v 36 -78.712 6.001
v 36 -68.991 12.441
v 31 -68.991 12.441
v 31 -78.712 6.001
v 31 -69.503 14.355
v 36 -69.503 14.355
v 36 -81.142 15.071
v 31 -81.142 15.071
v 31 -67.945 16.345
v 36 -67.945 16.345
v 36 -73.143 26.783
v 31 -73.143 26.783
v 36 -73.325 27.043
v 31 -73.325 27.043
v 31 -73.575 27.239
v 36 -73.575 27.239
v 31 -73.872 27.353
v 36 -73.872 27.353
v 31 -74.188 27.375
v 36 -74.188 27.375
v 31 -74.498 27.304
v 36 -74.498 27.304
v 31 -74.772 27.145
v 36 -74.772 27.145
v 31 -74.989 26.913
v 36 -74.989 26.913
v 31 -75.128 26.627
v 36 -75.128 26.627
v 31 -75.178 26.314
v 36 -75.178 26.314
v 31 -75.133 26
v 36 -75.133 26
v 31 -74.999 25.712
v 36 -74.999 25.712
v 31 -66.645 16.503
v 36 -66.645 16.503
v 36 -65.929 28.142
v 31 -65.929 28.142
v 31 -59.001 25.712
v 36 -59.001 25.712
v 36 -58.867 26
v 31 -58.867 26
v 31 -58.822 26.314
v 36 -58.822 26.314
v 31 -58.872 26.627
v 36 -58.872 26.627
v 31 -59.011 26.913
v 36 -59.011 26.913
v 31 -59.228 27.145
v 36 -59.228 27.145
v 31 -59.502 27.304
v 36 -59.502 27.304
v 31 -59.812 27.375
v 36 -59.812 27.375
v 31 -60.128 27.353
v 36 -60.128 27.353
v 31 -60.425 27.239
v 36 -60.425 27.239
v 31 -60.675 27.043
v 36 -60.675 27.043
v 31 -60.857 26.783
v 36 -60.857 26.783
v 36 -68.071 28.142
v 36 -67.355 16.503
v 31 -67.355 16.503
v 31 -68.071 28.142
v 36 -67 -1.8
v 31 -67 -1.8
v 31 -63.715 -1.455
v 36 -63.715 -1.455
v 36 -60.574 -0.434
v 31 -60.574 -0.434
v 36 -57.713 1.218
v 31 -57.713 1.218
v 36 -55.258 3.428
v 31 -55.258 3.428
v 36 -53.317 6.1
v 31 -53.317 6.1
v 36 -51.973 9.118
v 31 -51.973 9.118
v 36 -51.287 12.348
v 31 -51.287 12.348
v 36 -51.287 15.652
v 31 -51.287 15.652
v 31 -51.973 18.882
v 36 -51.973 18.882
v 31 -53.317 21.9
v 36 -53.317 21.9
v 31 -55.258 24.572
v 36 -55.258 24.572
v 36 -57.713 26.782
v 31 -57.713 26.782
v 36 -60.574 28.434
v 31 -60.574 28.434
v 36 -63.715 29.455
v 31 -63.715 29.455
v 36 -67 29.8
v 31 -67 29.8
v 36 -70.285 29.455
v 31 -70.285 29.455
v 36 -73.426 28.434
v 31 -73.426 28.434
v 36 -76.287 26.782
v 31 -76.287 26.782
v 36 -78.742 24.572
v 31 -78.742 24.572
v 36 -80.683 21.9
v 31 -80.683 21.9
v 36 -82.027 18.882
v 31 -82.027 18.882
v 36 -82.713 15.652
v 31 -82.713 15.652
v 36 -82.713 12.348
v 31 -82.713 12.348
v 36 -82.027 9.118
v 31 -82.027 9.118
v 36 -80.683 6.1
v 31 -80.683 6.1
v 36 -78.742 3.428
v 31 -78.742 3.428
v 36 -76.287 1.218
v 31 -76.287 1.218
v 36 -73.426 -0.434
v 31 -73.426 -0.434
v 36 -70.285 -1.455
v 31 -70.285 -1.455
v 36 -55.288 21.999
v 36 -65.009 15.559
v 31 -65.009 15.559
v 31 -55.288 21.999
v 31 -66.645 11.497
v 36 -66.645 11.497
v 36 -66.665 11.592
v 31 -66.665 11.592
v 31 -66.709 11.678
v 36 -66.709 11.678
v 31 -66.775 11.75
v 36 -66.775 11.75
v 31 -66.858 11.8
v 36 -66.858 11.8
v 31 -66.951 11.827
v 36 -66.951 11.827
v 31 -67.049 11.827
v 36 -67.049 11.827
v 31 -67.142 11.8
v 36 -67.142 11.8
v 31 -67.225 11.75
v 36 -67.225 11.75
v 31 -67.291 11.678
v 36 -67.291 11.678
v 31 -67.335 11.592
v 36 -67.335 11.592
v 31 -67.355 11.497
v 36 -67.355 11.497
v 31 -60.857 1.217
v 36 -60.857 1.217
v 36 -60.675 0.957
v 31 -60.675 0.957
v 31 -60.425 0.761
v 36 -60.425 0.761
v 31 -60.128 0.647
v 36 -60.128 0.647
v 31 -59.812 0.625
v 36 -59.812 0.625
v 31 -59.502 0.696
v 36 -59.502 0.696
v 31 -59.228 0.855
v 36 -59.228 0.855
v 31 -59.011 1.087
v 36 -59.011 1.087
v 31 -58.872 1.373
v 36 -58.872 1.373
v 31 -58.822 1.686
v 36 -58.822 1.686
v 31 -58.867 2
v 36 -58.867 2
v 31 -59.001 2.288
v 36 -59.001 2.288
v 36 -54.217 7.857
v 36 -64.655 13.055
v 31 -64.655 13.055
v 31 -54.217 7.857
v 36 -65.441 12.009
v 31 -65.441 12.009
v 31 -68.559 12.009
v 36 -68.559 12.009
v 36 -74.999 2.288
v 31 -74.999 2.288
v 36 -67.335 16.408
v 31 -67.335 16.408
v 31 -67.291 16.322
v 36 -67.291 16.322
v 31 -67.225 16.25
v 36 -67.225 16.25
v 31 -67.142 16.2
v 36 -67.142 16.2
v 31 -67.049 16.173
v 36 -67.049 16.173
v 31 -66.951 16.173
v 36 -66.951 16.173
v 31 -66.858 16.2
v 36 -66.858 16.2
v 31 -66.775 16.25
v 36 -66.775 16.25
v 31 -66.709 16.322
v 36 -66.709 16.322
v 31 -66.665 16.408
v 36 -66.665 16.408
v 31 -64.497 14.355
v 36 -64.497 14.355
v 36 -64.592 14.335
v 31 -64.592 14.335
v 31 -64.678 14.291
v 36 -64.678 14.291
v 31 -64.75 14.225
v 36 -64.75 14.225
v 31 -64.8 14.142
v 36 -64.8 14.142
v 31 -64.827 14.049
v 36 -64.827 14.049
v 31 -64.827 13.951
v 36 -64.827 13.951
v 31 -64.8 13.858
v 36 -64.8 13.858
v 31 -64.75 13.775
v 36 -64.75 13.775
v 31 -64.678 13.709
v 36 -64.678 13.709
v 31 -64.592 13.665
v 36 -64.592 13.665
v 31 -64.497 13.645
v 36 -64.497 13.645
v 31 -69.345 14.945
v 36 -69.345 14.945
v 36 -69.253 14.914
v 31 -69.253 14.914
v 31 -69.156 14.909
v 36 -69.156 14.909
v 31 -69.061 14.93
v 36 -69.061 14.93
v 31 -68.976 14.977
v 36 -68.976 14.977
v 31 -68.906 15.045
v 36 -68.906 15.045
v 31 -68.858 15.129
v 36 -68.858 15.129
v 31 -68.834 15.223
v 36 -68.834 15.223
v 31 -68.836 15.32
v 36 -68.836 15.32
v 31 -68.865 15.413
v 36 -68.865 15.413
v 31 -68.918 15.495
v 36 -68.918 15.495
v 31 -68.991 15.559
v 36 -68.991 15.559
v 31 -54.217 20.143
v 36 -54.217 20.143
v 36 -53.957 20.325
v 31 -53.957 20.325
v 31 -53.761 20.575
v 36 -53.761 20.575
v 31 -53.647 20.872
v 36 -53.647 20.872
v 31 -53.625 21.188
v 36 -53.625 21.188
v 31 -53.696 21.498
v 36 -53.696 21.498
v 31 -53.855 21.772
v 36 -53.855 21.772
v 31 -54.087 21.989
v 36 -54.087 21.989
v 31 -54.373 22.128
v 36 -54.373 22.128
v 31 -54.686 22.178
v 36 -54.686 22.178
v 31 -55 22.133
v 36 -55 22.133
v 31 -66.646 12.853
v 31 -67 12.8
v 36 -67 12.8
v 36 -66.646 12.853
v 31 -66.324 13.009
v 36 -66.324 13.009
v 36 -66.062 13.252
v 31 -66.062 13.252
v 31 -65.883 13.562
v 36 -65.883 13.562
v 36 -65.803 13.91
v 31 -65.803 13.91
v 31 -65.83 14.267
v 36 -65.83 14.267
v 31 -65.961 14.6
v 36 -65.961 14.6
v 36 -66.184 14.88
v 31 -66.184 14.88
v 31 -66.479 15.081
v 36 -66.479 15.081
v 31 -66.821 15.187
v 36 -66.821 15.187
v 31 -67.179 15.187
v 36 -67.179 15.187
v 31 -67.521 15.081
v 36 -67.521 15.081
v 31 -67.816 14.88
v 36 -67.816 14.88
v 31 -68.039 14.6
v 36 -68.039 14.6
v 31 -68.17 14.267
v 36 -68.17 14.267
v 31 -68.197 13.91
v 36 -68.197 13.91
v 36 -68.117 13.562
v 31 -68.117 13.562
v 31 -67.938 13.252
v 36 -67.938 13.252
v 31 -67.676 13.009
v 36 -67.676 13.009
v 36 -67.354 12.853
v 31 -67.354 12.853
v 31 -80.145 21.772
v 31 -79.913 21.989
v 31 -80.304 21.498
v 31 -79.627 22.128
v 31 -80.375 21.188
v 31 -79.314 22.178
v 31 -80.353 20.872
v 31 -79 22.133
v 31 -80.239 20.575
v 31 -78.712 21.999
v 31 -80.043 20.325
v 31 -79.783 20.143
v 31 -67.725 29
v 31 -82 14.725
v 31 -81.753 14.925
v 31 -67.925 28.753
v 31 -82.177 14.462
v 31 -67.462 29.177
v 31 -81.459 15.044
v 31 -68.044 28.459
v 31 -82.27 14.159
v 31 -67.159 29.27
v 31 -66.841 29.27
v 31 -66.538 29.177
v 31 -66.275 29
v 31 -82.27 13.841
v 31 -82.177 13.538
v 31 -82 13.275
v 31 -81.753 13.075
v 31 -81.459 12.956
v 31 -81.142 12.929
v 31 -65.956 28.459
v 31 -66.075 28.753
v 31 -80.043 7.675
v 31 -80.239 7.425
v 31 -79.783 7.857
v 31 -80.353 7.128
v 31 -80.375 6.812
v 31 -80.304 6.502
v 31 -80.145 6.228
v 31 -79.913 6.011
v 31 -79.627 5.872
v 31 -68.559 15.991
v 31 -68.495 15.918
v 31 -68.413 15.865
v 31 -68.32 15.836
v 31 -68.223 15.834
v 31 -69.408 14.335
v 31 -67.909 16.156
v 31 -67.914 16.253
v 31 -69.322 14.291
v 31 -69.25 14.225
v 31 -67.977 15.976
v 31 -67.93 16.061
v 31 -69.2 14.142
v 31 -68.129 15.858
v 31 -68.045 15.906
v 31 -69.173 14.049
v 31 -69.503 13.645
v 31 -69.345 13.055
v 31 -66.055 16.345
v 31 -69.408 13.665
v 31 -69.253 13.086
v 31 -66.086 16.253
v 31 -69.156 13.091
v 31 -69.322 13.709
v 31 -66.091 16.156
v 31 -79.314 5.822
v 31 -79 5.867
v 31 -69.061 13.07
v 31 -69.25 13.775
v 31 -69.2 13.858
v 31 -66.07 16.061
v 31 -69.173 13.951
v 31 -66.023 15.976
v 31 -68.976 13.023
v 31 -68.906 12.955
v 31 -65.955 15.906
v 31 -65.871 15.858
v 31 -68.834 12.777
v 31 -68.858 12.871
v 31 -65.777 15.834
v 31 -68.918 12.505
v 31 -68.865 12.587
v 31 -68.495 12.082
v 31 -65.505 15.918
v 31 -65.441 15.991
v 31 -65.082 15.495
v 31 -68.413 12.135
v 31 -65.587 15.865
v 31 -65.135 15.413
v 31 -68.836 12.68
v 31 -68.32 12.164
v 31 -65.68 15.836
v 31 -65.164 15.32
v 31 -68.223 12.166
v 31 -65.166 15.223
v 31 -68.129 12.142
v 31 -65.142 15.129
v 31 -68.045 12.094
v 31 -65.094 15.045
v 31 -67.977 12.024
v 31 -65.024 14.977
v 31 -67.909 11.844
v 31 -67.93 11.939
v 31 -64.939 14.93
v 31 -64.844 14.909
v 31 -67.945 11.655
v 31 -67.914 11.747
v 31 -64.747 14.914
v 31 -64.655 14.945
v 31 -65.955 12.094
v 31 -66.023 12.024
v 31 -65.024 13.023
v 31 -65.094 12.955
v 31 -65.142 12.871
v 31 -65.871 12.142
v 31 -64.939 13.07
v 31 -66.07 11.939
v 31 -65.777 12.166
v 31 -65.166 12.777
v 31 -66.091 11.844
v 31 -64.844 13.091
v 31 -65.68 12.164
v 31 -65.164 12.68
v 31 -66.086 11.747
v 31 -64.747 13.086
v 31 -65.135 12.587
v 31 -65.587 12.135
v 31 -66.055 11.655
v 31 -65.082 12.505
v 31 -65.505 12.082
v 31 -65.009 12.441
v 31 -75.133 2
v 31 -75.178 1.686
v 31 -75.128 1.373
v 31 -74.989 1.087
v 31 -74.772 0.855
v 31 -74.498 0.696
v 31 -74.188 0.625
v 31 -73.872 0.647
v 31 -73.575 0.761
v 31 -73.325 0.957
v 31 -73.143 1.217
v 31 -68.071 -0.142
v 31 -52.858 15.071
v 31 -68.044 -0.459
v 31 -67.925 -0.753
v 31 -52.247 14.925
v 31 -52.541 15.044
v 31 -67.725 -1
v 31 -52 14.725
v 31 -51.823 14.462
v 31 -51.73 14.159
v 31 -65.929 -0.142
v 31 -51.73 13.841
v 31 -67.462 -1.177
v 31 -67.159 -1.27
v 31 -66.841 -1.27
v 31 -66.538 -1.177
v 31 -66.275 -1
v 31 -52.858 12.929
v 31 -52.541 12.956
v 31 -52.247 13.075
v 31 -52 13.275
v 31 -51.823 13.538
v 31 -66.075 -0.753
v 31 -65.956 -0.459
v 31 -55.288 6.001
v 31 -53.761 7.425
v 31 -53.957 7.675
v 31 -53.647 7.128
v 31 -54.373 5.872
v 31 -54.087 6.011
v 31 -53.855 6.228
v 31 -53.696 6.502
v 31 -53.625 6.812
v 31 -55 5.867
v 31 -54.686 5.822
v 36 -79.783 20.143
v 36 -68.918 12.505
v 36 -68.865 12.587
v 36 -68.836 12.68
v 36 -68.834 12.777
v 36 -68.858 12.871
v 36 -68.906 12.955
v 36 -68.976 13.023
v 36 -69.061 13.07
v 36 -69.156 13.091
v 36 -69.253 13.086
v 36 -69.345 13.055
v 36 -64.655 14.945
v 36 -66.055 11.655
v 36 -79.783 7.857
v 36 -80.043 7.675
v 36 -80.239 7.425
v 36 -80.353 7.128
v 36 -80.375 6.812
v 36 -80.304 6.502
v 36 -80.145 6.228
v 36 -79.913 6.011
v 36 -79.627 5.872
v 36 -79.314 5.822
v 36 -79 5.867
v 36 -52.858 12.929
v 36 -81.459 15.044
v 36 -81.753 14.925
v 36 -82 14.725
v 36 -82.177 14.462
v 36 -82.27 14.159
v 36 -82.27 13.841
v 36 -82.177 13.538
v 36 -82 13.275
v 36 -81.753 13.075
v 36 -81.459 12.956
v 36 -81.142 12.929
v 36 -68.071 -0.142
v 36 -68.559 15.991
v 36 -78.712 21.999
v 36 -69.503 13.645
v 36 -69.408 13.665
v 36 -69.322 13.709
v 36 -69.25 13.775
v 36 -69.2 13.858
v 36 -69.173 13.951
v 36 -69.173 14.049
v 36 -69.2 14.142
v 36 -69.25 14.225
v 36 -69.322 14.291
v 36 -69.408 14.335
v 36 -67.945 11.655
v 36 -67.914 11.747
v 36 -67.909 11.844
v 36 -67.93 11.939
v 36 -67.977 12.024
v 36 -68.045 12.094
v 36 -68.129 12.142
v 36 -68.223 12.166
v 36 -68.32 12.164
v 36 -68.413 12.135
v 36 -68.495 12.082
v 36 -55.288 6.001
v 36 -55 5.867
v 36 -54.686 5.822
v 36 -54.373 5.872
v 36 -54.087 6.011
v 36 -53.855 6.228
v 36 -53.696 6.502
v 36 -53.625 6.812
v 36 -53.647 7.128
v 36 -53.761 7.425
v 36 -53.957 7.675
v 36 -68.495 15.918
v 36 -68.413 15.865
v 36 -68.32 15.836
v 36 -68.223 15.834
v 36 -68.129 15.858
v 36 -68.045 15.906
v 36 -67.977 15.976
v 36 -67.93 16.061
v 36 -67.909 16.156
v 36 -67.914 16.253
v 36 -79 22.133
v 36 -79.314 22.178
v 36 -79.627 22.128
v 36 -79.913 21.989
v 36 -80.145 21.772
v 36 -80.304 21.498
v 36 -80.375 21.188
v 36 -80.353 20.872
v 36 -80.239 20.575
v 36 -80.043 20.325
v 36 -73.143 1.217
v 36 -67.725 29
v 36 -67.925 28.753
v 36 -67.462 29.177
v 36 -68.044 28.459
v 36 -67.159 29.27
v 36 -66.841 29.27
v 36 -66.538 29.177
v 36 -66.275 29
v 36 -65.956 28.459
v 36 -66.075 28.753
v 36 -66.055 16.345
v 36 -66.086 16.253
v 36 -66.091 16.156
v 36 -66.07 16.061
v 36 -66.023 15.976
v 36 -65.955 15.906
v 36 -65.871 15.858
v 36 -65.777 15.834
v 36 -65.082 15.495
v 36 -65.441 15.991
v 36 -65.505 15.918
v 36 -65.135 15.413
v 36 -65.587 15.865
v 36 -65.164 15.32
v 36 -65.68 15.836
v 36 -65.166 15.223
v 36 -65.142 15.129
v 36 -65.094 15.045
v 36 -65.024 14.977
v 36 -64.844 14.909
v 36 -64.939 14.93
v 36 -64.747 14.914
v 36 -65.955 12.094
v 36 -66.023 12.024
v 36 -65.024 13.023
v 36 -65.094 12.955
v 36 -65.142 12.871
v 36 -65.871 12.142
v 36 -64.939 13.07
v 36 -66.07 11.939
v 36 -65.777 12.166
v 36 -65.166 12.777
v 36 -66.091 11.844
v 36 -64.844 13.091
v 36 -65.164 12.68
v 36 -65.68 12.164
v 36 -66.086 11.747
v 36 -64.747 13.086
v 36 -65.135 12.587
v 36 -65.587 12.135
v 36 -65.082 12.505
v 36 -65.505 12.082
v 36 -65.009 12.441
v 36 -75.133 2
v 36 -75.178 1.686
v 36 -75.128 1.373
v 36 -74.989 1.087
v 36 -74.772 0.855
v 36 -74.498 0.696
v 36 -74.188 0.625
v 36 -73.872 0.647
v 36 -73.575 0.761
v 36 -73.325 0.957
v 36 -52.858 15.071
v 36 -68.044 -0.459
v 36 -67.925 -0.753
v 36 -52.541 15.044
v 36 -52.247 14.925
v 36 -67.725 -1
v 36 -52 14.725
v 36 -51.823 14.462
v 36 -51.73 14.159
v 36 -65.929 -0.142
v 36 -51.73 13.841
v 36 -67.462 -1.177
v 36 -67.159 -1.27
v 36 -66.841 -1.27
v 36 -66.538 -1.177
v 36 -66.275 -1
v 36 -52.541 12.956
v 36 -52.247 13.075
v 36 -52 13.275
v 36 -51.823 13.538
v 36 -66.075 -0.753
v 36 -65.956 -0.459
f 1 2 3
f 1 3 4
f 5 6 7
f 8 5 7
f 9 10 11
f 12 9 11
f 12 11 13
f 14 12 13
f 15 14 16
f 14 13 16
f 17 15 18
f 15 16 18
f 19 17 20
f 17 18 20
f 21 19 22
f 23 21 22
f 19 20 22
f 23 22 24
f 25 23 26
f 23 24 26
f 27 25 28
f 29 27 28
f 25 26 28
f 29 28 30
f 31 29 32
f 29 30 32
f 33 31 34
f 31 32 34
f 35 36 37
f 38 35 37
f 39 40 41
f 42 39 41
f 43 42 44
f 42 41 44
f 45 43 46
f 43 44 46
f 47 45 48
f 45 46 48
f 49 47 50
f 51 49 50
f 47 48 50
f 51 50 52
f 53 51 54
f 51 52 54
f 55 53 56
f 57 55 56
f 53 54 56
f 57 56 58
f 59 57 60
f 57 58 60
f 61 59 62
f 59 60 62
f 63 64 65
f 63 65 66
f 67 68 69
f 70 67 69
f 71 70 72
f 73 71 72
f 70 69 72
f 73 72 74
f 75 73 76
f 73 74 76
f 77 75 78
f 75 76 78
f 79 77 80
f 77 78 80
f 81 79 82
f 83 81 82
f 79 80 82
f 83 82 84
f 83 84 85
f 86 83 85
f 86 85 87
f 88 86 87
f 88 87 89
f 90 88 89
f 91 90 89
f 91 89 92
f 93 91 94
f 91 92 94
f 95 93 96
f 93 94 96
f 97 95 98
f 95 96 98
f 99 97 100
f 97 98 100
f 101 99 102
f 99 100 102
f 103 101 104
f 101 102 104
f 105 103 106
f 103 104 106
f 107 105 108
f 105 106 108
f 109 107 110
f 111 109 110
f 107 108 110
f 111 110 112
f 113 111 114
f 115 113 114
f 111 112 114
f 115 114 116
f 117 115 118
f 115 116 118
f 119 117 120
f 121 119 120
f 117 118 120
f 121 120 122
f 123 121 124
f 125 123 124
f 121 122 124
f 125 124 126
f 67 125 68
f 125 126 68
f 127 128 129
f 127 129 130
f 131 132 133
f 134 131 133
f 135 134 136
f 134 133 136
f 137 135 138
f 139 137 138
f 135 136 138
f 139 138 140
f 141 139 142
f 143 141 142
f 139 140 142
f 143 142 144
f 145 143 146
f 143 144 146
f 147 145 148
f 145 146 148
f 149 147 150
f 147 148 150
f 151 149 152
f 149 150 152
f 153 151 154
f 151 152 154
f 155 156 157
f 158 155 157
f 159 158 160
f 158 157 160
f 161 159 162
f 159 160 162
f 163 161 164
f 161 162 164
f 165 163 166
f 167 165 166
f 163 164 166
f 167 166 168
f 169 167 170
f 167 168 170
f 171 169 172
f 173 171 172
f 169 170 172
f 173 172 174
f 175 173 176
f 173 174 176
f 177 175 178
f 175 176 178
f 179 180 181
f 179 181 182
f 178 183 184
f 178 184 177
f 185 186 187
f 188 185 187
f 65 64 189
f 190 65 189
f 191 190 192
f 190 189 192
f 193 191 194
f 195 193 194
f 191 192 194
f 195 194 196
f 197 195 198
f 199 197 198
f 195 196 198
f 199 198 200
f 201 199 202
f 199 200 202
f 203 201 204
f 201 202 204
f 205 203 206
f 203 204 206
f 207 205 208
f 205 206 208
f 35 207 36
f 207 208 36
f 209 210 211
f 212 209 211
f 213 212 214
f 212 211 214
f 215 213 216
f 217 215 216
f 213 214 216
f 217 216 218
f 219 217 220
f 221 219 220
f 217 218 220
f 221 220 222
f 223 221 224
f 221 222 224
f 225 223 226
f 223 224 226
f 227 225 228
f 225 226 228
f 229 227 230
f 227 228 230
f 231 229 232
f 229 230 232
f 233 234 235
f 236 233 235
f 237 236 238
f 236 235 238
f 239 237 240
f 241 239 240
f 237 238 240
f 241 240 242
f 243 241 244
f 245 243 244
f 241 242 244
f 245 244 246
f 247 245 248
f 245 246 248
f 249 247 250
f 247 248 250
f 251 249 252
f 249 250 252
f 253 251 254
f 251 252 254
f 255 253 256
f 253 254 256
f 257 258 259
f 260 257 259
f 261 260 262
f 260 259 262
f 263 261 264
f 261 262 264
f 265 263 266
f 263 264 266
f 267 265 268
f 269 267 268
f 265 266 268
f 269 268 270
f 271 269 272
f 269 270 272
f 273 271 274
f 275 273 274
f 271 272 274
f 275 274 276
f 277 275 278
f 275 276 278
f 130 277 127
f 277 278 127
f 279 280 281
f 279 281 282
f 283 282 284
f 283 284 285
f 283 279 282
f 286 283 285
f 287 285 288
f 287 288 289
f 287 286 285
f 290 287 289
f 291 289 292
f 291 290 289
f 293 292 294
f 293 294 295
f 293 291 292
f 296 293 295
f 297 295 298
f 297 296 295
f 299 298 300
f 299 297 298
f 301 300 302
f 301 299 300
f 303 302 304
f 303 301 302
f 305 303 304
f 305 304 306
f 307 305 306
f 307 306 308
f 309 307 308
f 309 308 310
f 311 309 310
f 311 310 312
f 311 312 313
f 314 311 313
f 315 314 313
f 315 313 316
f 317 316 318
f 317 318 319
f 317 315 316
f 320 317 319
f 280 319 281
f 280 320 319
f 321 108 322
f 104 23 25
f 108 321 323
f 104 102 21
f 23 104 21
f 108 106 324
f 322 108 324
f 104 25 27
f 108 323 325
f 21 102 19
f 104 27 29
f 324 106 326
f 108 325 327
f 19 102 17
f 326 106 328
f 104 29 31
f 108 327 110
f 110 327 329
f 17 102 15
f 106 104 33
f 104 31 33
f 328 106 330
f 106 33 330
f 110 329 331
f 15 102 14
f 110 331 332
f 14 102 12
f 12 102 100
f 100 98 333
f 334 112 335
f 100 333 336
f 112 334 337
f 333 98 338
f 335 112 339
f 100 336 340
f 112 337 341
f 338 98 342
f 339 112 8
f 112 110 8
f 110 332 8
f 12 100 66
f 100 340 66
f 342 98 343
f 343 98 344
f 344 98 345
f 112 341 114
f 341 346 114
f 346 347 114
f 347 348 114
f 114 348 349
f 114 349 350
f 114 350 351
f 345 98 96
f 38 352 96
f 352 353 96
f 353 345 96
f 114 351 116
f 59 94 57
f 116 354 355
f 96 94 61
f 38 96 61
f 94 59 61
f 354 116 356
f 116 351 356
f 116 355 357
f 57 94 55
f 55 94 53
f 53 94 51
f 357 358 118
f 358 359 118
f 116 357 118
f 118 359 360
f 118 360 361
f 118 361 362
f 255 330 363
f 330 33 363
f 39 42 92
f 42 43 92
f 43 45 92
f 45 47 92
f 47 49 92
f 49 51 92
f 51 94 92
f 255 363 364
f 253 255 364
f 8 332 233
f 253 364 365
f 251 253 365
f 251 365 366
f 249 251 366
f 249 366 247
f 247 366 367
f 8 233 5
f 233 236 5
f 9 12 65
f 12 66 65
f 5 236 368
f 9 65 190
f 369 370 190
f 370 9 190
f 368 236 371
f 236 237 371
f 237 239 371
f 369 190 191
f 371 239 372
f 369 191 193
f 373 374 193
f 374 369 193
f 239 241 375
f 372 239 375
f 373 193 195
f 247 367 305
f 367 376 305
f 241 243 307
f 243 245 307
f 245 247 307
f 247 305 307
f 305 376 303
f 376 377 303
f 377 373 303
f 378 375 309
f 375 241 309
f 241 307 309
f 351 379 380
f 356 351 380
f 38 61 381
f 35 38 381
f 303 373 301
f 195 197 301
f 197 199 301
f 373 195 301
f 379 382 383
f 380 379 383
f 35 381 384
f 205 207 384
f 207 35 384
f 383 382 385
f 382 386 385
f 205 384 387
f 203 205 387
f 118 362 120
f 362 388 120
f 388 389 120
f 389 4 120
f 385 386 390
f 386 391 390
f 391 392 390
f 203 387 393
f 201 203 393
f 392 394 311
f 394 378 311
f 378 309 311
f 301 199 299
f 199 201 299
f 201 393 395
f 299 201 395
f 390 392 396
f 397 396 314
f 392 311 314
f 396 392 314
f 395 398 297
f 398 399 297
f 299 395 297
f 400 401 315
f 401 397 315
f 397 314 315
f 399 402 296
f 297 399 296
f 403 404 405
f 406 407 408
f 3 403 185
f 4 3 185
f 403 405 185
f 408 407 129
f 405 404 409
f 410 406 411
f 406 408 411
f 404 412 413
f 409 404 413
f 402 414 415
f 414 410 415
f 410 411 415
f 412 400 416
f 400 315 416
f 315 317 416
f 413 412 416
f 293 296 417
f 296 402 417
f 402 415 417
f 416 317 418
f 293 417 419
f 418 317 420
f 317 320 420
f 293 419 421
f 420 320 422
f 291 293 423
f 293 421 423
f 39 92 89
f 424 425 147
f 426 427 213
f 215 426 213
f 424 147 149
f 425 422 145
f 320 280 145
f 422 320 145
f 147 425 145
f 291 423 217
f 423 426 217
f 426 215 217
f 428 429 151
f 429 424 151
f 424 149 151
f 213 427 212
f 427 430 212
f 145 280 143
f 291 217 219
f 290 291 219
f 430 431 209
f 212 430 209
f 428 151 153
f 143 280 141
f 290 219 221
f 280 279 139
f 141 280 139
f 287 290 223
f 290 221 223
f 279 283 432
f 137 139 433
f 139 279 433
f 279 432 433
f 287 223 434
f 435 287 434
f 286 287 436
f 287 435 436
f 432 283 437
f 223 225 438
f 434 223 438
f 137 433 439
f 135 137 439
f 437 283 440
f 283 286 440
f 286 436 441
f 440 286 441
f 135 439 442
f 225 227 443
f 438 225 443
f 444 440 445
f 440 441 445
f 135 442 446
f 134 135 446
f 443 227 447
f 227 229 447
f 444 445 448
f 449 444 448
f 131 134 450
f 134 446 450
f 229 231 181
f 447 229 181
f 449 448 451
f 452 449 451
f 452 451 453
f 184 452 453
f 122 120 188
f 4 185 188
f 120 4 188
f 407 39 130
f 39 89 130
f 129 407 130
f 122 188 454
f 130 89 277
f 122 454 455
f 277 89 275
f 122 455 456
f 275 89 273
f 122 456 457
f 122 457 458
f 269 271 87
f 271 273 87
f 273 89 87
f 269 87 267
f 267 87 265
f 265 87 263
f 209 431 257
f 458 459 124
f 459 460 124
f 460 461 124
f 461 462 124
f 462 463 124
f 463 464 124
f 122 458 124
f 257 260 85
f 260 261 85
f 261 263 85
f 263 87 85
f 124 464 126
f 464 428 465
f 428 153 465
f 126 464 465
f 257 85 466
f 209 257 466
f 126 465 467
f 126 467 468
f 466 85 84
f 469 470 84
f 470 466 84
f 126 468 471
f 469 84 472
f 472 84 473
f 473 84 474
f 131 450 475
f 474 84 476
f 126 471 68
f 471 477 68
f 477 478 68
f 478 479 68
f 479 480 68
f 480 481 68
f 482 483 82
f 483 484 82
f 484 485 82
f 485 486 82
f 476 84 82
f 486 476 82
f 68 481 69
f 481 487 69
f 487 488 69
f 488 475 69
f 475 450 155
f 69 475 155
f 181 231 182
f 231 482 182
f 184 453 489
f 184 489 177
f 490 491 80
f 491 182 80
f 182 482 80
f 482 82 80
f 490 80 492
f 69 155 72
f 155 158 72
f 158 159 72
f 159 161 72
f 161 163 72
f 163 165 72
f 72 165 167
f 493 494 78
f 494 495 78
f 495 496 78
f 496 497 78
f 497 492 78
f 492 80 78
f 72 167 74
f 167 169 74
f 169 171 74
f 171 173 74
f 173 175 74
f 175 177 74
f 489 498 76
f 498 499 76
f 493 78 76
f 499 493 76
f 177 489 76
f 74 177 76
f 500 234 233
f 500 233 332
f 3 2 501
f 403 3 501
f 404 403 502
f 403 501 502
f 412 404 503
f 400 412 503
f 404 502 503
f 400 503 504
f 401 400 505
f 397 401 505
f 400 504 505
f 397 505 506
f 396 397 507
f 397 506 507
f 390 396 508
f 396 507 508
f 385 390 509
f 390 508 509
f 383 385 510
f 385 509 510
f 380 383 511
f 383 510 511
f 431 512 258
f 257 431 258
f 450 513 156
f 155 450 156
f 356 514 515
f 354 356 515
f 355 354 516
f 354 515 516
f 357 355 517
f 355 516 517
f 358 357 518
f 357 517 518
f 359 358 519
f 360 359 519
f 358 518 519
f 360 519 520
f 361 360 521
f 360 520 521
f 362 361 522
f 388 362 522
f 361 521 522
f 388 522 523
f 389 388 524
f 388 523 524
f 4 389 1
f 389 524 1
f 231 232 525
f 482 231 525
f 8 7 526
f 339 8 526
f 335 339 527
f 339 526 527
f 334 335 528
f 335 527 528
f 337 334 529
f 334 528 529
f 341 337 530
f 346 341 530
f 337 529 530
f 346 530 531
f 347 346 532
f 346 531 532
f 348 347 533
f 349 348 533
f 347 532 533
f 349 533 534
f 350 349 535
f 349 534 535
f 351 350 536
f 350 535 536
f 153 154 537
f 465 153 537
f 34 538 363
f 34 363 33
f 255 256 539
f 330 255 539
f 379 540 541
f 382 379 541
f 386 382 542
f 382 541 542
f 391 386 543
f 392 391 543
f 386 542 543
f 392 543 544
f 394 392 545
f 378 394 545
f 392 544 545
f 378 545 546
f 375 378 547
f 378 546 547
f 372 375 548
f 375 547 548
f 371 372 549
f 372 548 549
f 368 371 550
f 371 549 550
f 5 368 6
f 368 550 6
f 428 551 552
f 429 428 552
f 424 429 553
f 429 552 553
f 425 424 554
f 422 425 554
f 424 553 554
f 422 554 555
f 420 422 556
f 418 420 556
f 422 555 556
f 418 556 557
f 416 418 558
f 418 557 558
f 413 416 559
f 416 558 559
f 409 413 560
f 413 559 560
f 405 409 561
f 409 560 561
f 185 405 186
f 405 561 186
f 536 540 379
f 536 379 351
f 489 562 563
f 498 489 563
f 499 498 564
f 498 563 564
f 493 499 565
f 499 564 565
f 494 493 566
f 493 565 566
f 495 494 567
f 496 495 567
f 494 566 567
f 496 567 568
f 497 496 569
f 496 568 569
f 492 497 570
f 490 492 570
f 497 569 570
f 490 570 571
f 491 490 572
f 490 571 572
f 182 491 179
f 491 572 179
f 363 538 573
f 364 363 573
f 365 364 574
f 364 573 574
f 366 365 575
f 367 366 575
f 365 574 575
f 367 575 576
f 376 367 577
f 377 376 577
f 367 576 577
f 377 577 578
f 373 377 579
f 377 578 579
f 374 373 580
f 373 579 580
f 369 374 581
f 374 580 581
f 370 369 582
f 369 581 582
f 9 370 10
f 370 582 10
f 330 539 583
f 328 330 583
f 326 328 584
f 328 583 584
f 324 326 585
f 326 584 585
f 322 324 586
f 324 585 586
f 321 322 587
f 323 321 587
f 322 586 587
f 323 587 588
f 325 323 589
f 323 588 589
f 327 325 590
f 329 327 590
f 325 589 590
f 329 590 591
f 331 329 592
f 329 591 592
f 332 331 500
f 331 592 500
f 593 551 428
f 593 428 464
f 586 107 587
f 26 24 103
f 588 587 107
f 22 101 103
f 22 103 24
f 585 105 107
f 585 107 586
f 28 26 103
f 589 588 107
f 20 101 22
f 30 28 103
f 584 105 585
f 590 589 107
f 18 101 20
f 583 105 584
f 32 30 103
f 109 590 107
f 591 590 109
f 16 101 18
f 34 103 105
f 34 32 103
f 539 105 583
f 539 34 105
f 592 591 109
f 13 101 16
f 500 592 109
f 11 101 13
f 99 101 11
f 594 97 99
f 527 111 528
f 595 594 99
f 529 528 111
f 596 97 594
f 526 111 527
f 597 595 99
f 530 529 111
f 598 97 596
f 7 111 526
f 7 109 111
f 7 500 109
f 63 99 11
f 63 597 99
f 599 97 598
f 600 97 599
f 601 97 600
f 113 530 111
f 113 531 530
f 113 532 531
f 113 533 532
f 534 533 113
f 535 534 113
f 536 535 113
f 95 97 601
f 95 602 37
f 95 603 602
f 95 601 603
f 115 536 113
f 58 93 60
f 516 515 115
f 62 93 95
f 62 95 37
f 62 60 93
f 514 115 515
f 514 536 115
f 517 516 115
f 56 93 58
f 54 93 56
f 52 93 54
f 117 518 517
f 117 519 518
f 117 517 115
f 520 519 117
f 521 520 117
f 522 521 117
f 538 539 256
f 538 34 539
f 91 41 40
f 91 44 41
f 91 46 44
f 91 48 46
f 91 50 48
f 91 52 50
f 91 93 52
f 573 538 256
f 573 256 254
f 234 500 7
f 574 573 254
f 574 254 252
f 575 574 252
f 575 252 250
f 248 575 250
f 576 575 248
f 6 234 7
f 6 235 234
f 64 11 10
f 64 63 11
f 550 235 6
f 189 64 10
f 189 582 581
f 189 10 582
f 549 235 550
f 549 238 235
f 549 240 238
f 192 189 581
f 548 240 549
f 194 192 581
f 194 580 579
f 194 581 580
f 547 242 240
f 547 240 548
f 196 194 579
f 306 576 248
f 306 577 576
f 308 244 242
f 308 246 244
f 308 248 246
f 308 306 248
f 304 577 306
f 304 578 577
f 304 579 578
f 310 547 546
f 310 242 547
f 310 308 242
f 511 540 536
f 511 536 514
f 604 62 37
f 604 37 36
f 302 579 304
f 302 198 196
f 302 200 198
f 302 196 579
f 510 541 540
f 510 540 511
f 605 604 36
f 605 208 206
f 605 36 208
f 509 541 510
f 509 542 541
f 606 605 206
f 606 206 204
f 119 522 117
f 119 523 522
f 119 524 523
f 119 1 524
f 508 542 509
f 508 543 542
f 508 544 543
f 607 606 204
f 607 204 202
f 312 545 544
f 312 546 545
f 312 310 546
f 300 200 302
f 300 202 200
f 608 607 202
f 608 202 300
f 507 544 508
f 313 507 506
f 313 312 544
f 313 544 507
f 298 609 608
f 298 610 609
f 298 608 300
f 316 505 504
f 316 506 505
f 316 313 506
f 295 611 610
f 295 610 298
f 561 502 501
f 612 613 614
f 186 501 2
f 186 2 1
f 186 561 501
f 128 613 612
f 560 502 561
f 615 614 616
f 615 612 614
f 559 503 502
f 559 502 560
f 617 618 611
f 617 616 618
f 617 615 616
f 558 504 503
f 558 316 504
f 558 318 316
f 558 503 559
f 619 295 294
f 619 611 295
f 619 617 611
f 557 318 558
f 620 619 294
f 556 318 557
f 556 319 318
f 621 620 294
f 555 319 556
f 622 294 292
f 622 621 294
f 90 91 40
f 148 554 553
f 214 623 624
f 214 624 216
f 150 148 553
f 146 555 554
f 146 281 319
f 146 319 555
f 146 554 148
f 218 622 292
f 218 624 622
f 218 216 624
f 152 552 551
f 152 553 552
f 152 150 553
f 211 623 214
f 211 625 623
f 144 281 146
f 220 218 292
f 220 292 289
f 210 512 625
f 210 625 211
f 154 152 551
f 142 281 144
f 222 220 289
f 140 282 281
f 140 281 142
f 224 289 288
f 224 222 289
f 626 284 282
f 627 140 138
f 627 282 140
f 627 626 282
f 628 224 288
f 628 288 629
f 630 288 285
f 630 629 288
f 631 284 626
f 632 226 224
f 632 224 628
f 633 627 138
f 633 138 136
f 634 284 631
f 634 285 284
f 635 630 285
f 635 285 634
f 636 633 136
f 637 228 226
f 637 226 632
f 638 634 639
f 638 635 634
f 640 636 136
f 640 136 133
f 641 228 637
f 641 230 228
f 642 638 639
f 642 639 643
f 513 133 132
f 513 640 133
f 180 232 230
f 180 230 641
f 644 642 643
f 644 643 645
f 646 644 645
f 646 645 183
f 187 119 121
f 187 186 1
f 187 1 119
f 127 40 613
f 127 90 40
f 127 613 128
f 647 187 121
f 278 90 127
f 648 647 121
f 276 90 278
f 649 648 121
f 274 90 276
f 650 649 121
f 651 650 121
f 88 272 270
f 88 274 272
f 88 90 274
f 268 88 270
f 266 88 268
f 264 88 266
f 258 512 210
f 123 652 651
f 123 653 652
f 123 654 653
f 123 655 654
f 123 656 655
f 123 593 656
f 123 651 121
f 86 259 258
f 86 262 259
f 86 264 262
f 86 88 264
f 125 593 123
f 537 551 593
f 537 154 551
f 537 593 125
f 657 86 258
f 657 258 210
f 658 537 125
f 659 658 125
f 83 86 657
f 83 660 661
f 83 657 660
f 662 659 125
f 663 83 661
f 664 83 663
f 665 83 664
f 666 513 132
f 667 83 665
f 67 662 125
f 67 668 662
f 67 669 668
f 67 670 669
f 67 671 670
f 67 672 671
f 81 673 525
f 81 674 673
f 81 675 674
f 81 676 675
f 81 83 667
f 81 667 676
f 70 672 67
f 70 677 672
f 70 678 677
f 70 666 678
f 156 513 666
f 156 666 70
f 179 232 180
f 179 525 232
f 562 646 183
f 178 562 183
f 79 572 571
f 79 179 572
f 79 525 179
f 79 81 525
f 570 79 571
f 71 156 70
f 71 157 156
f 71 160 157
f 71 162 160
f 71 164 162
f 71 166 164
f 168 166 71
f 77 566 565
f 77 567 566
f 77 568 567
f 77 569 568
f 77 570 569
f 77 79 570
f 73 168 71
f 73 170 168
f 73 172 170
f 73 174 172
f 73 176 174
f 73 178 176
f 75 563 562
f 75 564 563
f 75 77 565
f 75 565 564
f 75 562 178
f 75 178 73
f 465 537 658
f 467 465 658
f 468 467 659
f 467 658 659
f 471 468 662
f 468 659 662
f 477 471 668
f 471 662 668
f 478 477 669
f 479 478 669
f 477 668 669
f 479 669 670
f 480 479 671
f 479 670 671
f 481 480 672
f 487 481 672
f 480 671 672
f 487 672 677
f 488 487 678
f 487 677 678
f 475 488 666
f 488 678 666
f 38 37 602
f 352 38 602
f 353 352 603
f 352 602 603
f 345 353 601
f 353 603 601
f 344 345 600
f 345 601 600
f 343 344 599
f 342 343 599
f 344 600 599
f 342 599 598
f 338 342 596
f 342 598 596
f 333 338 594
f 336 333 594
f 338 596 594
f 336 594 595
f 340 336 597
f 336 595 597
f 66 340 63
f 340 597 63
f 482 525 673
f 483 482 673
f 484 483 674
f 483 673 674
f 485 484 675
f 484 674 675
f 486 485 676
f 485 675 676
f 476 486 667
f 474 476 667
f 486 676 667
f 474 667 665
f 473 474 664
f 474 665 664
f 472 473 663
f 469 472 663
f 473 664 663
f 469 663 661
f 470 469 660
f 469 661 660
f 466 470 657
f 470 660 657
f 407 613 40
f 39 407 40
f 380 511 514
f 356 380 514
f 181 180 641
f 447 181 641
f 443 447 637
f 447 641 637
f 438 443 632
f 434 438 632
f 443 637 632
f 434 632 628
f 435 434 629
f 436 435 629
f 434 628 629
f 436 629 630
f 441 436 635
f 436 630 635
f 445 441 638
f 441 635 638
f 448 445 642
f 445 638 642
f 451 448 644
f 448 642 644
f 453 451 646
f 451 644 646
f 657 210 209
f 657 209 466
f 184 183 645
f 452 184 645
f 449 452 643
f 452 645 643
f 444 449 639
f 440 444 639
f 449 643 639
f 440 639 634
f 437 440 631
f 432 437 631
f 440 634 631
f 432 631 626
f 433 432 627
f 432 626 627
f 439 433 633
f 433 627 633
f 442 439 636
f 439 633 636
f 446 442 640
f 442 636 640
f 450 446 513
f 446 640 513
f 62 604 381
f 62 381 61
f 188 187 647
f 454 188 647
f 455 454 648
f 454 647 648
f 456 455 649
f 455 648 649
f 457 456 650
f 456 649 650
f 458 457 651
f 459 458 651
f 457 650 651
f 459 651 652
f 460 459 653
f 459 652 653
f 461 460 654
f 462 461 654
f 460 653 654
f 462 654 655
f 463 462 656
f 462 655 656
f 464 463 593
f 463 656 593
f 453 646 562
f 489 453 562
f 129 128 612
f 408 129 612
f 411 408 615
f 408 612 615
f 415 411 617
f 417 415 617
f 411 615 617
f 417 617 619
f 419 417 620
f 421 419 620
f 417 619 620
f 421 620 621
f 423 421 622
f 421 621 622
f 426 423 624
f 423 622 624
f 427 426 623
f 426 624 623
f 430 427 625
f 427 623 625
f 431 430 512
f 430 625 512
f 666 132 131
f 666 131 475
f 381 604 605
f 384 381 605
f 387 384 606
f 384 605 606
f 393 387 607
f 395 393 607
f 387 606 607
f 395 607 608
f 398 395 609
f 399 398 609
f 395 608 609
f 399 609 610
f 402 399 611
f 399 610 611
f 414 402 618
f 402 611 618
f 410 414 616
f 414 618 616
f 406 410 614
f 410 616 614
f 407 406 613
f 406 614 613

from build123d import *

# Parameters (mm, degrees)
SKETCH002_R             = 15.8
SKETCH002_R_2           = 1.2
PAD002_DEPTH            = 5
POCKET_DEPTH            = 5
POLARPATTERN_COUNT      = 12
BODY002_PLACEMENT_ANGLE = 90


with BuildPart() as part:
    # Sketch002 → Pad002 (new body)
    with BuildSketch(Plane.XY):
        Circle(SKETCH002_R)
        Circle(SKETCH002_R_2, mode=Mode.SUBTRACT)
    extrude(amount=PAD002_DEPTH)

    # Sketch003 (on Face4 of Pad002) → Pocket (cut)
    with BuildSketch(Plane.XY.offset(5)):
        with BuildLine():
            ThreePointArc((-0.354655, 2.503453), (0, 2.169967), (0.354655, 2.503453))
            Line((0.354655, 2.503453), (1.071428, 14.142374))
            ThreePointArc((1.071428, 14.142374), (0, 15.281815), (-1.071428, 14.142374))
            Line((-0.354655, 2.503453), (-1.071428, 14.142374))
        make_face()
    pocket = extrude(amount=-POCKET_DEPTH, mode=Mode.SUBTRACT)

    # PolarPattern: Pocket ×12 about axis
    polarpattern_axis = Axis((0, 0, 0), (0, 0, 1))
    for i in range(1, POLARPATTERN_COUNT):
        add(pocket.rotate(polarpattern_axis, i * 360 / POLARPATTERN_COUNT), mode=Mode.SUBTRACT)


with BuildPart() as part_1:
    # Body002 placement: moved
    add(part.part.moved(Location((31, -67, 14))).rotate(Axis((31, -67, 14), (0, 1, 0)), BODY002_PLACEMENT_ANGLE))


solid = part_1.part
